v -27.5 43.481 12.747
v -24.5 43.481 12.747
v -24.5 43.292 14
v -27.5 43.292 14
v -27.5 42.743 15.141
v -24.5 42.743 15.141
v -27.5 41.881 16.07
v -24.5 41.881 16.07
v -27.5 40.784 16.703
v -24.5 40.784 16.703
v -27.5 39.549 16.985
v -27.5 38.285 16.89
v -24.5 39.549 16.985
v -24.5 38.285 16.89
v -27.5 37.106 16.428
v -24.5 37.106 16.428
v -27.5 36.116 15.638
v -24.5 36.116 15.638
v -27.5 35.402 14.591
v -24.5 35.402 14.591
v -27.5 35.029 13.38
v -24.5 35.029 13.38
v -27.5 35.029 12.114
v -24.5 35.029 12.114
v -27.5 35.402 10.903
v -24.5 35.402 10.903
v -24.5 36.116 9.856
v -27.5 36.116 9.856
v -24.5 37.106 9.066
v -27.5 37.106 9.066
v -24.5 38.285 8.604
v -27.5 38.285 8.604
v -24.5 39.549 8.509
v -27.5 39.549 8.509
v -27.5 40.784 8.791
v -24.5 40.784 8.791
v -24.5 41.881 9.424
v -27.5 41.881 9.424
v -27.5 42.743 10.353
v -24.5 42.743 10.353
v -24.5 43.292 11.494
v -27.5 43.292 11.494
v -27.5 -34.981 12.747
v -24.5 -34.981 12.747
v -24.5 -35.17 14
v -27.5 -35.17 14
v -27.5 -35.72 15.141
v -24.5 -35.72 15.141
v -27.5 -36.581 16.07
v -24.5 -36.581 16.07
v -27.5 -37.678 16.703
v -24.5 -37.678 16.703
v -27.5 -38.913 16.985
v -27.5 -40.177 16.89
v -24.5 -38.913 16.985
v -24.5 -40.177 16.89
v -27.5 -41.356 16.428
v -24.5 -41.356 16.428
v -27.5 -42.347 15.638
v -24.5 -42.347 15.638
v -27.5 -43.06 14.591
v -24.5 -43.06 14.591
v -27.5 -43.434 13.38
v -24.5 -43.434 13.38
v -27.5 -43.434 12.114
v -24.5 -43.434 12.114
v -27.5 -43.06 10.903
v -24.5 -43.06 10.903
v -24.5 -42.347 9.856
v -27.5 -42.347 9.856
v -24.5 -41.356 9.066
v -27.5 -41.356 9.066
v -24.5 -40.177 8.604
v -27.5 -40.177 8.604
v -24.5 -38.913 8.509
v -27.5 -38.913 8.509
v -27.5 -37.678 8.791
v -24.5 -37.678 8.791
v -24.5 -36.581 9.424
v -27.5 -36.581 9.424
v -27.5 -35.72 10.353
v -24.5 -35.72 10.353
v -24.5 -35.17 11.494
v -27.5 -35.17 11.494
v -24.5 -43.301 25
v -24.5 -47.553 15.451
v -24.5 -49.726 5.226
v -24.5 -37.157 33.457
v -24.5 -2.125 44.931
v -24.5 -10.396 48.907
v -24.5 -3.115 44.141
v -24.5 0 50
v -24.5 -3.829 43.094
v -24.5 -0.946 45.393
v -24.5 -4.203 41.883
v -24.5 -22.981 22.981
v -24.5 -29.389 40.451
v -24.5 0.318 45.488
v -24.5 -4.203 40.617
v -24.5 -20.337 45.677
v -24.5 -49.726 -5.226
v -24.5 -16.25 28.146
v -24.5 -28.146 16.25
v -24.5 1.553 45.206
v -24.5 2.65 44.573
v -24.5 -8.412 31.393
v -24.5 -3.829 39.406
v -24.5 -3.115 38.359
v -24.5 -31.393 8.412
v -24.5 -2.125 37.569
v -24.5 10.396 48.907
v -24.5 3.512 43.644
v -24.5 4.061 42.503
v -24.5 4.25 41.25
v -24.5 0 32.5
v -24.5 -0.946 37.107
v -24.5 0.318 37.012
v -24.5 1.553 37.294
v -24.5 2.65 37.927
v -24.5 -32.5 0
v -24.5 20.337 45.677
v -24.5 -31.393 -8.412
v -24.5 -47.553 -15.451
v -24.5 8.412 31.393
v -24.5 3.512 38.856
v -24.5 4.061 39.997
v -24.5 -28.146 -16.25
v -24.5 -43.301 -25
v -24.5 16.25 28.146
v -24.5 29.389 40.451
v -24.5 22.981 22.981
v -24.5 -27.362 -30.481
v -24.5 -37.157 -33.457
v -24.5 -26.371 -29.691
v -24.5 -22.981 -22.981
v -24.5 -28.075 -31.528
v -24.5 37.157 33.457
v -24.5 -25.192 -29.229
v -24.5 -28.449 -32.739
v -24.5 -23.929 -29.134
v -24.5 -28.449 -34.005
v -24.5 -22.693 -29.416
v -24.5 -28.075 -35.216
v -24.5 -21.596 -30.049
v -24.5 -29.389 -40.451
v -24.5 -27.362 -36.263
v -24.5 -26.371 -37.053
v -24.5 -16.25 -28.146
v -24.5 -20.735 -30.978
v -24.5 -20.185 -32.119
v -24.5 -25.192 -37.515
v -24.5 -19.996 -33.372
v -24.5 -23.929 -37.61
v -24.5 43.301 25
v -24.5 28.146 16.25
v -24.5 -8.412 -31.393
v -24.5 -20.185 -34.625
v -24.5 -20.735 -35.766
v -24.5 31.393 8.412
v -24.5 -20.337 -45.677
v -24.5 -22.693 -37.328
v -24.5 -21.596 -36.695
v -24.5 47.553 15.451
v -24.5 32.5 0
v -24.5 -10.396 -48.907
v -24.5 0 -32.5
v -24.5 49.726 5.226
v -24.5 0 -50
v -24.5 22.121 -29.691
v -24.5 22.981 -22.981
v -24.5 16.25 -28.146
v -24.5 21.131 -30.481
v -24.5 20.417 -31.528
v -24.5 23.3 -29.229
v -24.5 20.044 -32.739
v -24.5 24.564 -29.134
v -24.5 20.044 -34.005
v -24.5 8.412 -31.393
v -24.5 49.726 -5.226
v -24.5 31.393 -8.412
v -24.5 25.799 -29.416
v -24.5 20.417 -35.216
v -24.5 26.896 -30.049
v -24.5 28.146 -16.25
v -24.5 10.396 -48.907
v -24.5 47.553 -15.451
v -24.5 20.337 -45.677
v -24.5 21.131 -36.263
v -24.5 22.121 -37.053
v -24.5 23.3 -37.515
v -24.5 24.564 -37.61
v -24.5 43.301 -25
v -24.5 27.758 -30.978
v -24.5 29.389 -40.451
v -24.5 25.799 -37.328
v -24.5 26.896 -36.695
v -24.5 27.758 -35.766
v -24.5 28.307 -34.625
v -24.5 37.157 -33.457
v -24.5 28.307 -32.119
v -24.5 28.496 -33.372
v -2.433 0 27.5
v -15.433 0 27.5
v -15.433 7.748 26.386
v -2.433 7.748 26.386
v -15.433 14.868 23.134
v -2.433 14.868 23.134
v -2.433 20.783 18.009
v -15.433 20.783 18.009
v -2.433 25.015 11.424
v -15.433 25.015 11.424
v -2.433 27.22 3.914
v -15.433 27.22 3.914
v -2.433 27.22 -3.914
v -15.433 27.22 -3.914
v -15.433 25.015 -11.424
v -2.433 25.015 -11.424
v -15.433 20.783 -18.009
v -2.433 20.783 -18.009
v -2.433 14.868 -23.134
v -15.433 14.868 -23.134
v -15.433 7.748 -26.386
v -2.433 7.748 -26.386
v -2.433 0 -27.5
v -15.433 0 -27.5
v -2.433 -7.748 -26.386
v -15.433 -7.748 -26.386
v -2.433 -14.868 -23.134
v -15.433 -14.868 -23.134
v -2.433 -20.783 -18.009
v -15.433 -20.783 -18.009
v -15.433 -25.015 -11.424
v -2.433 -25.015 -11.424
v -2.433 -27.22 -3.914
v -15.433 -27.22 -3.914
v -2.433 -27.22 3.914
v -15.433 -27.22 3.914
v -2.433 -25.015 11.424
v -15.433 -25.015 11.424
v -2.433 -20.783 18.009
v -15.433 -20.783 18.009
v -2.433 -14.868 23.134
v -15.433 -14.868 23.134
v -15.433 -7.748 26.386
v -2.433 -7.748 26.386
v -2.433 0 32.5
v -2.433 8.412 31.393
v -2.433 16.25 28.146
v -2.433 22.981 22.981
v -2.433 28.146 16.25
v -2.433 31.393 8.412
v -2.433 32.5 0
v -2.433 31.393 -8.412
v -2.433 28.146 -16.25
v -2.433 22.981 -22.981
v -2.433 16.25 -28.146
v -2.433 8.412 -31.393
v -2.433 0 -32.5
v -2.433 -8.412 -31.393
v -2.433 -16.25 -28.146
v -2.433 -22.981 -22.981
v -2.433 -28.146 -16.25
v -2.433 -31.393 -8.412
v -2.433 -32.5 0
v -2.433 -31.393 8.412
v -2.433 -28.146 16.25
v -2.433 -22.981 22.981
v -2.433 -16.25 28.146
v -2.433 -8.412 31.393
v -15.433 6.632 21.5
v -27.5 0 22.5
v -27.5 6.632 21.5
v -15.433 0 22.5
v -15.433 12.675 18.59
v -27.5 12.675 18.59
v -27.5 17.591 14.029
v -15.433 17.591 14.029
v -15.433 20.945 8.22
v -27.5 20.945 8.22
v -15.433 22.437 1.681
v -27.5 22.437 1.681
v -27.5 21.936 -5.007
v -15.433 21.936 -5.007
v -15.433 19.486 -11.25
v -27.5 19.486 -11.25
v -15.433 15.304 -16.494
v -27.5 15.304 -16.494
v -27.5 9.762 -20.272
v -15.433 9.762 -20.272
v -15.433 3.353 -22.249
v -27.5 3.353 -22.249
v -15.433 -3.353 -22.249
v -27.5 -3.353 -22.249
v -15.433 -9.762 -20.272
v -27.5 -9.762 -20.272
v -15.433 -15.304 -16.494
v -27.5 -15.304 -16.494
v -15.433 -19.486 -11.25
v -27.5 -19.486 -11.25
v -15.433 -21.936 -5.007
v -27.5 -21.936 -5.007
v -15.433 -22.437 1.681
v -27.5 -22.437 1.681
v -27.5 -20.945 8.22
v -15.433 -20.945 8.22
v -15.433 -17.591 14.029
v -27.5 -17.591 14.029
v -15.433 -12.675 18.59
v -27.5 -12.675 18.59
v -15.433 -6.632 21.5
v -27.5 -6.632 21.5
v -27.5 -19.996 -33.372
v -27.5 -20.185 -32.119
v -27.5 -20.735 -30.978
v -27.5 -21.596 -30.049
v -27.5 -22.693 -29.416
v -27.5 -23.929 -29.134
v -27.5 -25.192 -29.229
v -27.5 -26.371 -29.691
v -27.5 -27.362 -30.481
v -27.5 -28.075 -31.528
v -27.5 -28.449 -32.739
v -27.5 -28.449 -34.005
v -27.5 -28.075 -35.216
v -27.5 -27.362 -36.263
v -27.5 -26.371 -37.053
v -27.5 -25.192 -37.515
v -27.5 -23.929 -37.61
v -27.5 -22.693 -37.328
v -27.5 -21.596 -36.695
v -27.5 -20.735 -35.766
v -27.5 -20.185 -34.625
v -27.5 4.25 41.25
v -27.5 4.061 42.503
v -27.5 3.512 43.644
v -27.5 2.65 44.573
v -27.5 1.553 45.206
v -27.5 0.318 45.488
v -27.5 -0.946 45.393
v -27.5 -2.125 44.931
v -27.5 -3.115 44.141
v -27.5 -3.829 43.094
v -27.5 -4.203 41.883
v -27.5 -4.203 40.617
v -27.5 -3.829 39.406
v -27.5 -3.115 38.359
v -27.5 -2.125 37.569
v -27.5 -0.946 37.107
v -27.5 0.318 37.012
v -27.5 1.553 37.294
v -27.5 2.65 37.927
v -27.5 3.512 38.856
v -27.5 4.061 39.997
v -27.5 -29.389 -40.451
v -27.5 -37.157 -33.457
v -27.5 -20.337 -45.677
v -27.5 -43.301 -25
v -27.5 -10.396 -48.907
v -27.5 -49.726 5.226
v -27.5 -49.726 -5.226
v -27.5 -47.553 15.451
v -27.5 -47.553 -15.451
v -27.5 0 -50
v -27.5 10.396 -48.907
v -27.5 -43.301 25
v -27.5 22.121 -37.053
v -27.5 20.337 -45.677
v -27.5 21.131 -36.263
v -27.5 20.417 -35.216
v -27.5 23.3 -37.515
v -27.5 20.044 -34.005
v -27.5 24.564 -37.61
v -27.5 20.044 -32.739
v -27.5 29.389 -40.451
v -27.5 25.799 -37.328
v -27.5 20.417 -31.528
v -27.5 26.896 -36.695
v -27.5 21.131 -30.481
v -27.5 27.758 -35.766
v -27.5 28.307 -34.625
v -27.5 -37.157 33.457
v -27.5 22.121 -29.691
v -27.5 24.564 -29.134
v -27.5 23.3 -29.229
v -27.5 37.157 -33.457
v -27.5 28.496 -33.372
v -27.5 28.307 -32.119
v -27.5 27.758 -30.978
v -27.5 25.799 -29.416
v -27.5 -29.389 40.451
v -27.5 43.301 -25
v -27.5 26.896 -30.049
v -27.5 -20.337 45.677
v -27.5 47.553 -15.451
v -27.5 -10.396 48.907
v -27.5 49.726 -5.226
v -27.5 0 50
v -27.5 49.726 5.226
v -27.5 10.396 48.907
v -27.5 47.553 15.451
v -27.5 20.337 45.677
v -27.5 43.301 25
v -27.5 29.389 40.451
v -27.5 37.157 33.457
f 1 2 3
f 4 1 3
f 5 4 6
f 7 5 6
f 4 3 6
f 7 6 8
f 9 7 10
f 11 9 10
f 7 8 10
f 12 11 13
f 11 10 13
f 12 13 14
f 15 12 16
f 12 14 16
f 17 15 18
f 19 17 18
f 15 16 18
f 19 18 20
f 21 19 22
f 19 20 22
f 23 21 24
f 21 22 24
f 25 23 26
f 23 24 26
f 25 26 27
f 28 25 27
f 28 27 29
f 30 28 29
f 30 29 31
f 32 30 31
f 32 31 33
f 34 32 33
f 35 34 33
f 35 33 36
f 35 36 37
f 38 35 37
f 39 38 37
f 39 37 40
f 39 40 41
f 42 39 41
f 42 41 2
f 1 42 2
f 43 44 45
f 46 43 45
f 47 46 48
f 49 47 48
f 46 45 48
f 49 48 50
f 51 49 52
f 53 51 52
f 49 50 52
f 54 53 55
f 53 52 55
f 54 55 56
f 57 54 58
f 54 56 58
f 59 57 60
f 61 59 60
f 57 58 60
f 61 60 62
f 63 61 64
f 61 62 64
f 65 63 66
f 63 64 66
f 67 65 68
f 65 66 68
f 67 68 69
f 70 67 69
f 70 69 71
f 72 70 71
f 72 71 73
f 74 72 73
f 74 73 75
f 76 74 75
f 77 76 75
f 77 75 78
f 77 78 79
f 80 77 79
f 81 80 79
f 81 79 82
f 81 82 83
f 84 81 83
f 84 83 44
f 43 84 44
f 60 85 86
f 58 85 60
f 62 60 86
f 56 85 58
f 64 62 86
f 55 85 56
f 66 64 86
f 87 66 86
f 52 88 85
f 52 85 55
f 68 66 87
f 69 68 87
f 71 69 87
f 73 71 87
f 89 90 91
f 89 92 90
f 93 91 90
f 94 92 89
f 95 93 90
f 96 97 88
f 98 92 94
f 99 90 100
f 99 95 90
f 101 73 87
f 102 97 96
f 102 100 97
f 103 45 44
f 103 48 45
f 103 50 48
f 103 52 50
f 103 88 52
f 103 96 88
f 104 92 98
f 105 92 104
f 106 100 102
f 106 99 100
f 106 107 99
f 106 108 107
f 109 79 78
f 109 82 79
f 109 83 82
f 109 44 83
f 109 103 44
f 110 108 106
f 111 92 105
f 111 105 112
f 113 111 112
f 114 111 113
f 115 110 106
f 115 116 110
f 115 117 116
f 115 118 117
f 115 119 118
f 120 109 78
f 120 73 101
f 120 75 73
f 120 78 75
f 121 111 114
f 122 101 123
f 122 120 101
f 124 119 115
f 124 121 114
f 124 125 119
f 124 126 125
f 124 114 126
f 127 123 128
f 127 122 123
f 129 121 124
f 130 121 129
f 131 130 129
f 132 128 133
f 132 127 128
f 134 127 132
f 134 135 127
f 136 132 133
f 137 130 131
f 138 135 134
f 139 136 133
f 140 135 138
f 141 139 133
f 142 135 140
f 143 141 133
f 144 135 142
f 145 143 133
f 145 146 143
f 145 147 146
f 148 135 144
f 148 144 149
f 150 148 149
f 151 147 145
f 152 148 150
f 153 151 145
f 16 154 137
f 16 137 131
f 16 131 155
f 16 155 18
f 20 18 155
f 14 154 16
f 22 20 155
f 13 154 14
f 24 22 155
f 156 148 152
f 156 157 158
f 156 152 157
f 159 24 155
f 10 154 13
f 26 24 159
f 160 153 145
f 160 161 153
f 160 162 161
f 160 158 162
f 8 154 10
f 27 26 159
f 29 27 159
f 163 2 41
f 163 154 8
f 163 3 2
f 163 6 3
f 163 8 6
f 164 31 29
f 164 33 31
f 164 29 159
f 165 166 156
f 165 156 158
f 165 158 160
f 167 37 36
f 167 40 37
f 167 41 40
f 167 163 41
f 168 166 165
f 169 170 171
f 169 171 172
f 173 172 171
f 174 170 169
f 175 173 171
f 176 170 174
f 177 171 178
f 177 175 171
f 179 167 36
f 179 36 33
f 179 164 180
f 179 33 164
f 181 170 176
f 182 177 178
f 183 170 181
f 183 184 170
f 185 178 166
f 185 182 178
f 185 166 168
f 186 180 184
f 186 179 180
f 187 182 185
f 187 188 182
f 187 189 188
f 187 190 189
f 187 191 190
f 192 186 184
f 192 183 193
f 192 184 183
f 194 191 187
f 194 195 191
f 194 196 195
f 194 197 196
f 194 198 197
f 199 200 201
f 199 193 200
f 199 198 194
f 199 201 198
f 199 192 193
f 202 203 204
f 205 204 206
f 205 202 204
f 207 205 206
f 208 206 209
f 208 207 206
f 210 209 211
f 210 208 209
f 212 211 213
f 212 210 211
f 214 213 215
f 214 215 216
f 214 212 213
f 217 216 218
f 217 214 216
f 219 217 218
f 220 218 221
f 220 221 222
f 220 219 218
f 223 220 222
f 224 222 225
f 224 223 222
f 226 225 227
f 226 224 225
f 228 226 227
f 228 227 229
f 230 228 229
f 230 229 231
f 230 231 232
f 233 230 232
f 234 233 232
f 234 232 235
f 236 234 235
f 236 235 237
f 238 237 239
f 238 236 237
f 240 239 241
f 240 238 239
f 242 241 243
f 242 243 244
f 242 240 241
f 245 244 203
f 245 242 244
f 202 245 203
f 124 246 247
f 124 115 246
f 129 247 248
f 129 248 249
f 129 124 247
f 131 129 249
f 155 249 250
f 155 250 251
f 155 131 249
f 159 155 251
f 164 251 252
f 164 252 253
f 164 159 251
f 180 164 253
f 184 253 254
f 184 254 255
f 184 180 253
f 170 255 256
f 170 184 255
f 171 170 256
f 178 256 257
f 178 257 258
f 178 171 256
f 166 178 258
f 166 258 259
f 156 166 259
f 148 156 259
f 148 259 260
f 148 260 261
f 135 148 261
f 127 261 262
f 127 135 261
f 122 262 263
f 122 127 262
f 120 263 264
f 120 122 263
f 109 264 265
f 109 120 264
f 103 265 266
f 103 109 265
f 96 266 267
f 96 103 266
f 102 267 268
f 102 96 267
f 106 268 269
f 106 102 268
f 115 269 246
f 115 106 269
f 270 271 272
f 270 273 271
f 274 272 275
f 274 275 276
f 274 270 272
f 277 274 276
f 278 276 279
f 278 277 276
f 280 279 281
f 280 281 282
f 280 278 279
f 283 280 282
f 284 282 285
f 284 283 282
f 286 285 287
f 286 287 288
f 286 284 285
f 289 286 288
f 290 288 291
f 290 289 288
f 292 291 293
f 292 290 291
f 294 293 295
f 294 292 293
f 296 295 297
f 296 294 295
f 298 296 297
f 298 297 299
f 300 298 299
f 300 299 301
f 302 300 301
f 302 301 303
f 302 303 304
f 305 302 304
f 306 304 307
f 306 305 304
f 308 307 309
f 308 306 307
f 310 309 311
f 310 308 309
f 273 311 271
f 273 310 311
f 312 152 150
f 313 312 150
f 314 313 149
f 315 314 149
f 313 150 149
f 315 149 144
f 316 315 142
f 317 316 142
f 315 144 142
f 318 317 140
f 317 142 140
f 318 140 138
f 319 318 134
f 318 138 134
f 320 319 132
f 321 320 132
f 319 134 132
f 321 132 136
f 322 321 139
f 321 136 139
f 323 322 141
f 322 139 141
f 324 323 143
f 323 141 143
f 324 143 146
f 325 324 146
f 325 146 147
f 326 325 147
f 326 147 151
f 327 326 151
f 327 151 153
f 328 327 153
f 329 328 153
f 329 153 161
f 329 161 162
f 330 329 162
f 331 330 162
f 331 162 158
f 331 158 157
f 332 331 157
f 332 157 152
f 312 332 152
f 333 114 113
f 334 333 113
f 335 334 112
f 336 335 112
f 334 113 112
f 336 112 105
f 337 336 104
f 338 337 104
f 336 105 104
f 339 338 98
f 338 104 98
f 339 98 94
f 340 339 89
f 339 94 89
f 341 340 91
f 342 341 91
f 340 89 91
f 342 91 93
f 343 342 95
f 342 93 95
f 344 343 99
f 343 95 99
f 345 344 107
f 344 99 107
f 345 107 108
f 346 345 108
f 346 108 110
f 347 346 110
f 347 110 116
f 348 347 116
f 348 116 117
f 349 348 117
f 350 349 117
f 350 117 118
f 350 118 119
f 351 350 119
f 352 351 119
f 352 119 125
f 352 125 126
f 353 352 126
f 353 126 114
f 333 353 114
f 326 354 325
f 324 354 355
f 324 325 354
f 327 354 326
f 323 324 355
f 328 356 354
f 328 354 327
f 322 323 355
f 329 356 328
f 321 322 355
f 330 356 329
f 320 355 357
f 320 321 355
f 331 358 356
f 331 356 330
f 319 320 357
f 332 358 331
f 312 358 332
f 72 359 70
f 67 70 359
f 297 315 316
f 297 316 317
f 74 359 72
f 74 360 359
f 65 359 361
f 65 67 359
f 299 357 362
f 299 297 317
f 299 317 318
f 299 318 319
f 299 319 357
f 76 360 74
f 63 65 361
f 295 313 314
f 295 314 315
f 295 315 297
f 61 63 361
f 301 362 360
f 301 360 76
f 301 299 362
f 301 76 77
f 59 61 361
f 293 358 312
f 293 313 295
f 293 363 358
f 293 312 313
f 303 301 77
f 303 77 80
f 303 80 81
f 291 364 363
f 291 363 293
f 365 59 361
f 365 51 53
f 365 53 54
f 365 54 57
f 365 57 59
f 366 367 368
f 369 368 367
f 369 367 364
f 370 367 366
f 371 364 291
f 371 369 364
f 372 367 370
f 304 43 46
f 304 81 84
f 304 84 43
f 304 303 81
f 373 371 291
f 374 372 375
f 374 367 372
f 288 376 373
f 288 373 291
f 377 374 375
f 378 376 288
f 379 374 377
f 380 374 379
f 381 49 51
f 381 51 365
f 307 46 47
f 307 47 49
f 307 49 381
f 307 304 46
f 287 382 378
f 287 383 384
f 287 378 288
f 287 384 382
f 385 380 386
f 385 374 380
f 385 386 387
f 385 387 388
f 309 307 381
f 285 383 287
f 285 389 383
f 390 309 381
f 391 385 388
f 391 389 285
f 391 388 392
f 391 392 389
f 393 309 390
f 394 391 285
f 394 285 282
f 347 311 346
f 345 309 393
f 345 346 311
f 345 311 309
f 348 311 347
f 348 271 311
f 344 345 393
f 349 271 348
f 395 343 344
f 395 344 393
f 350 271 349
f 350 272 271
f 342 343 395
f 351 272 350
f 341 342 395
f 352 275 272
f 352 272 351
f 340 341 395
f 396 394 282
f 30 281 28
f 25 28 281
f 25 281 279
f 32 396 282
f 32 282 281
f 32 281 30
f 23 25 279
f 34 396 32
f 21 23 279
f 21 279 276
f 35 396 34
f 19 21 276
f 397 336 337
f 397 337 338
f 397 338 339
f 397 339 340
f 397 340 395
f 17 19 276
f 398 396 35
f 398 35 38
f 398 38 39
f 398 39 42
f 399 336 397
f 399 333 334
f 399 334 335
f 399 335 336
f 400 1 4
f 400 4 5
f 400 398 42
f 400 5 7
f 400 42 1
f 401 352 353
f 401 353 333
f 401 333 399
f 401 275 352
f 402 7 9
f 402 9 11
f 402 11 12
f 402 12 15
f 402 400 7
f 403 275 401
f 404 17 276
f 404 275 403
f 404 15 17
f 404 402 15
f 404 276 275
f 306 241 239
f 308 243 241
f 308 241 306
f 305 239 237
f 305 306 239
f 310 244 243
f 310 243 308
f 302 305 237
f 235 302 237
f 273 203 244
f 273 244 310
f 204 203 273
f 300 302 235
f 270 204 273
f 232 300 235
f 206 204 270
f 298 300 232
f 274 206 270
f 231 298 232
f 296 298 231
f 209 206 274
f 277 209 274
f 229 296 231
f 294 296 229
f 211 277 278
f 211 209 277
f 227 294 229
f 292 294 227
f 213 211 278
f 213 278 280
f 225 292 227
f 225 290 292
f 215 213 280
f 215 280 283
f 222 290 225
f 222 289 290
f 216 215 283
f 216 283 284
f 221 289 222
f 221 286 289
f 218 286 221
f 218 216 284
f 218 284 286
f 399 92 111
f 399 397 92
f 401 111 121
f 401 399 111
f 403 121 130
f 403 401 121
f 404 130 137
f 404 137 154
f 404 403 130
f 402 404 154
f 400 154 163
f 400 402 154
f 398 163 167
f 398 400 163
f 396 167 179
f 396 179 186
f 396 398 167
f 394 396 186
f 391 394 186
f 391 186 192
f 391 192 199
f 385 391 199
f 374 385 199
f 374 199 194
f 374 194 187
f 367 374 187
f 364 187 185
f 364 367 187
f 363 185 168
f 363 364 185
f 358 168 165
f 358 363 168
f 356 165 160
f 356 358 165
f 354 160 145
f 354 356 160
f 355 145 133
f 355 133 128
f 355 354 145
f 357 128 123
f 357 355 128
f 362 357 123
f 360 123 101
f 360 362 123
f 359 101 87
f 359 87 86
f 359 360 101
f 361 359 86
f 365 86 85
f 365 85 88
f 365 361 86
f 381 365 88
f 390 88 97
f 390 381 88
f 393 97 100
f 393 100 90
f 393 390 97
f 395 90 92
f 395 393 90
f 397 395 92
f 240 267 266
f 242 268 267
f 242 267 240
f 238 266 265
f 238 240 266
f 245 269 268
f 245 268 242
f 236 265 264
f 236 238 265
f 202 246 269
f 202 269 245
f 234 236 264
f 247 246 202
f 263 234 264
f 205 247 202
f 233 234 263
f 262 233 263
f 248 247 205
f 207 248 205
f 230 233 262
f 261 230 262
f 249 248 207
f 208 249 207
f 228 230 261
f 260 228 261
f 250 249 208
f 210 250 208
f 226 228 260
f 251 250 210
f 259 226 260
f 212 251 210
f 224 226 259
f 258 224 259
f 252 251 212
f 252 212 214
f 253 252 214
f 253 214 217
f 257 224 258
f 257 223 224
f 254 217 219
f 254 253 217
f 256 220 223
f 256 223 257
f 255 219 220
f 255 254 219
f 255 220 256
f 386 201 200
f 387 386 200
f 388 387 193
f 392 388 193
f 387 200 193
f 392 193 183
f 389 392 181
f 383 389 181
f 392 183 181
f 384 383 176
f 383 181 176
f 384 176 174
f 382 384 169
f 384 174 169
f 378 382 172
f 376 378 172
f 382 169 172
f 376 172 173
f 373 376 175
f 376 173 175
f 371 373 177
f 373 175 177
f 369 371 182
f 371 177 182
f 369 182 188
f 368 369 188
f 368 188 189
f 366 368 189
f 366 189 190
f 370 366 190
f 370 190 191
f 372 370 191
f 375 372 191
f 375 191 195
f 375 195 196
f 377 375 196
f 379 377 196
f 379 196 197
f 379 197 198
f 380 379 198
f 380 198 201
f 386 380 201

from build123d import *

# Parameters (mm, degrees)
F3_D     = 8.5
F3_DEPTH = 49.5
F3_TIP   = 2.5536576309


# Not quite as in the source:
# - a feature names something its author has since deleted; it is built from what else it names


with BuildPart() as f1:
    # F0 (on Front) → F1 (revolve)
    with BuildSketch(Plane.XZ):
        Polygon((-15.4332816247, 27.5), (-2.4332816247, 27.5), (-2.4332816247, 32.5), (-24.5, 32.5), (-24.5, 50), (-27.5, 50), (-27.5, 22.5), (-15.4332816247, 22.5), align=None)
    revolve(axis=Axis((-62.9697144032, 0, 0), (-1, 0, 0)))

    # F3
    with Locations(Plane(origin=(-27.5, 0, 0), x_dir=(0, -1, 0), z_dir=(-1, 0, 0))):
        with Locations((0, 41.25), (39.2310812972, 12.746951018), (24.2461416571, -33.371951018), (-24.2461416571, -33.371951018), (-39.2310812972, 12.746951018)):
            Hole(F3_D / 2, depth=F3_DEPTH)
            with Locations((0, 0, -(F3_DEPTH + F3_TIP / 2))):  # 118° drill point
                Cone(0, F3_D / 2, F3_TIP, mode=Mode.SUBTRACT)


solid = f1.part
